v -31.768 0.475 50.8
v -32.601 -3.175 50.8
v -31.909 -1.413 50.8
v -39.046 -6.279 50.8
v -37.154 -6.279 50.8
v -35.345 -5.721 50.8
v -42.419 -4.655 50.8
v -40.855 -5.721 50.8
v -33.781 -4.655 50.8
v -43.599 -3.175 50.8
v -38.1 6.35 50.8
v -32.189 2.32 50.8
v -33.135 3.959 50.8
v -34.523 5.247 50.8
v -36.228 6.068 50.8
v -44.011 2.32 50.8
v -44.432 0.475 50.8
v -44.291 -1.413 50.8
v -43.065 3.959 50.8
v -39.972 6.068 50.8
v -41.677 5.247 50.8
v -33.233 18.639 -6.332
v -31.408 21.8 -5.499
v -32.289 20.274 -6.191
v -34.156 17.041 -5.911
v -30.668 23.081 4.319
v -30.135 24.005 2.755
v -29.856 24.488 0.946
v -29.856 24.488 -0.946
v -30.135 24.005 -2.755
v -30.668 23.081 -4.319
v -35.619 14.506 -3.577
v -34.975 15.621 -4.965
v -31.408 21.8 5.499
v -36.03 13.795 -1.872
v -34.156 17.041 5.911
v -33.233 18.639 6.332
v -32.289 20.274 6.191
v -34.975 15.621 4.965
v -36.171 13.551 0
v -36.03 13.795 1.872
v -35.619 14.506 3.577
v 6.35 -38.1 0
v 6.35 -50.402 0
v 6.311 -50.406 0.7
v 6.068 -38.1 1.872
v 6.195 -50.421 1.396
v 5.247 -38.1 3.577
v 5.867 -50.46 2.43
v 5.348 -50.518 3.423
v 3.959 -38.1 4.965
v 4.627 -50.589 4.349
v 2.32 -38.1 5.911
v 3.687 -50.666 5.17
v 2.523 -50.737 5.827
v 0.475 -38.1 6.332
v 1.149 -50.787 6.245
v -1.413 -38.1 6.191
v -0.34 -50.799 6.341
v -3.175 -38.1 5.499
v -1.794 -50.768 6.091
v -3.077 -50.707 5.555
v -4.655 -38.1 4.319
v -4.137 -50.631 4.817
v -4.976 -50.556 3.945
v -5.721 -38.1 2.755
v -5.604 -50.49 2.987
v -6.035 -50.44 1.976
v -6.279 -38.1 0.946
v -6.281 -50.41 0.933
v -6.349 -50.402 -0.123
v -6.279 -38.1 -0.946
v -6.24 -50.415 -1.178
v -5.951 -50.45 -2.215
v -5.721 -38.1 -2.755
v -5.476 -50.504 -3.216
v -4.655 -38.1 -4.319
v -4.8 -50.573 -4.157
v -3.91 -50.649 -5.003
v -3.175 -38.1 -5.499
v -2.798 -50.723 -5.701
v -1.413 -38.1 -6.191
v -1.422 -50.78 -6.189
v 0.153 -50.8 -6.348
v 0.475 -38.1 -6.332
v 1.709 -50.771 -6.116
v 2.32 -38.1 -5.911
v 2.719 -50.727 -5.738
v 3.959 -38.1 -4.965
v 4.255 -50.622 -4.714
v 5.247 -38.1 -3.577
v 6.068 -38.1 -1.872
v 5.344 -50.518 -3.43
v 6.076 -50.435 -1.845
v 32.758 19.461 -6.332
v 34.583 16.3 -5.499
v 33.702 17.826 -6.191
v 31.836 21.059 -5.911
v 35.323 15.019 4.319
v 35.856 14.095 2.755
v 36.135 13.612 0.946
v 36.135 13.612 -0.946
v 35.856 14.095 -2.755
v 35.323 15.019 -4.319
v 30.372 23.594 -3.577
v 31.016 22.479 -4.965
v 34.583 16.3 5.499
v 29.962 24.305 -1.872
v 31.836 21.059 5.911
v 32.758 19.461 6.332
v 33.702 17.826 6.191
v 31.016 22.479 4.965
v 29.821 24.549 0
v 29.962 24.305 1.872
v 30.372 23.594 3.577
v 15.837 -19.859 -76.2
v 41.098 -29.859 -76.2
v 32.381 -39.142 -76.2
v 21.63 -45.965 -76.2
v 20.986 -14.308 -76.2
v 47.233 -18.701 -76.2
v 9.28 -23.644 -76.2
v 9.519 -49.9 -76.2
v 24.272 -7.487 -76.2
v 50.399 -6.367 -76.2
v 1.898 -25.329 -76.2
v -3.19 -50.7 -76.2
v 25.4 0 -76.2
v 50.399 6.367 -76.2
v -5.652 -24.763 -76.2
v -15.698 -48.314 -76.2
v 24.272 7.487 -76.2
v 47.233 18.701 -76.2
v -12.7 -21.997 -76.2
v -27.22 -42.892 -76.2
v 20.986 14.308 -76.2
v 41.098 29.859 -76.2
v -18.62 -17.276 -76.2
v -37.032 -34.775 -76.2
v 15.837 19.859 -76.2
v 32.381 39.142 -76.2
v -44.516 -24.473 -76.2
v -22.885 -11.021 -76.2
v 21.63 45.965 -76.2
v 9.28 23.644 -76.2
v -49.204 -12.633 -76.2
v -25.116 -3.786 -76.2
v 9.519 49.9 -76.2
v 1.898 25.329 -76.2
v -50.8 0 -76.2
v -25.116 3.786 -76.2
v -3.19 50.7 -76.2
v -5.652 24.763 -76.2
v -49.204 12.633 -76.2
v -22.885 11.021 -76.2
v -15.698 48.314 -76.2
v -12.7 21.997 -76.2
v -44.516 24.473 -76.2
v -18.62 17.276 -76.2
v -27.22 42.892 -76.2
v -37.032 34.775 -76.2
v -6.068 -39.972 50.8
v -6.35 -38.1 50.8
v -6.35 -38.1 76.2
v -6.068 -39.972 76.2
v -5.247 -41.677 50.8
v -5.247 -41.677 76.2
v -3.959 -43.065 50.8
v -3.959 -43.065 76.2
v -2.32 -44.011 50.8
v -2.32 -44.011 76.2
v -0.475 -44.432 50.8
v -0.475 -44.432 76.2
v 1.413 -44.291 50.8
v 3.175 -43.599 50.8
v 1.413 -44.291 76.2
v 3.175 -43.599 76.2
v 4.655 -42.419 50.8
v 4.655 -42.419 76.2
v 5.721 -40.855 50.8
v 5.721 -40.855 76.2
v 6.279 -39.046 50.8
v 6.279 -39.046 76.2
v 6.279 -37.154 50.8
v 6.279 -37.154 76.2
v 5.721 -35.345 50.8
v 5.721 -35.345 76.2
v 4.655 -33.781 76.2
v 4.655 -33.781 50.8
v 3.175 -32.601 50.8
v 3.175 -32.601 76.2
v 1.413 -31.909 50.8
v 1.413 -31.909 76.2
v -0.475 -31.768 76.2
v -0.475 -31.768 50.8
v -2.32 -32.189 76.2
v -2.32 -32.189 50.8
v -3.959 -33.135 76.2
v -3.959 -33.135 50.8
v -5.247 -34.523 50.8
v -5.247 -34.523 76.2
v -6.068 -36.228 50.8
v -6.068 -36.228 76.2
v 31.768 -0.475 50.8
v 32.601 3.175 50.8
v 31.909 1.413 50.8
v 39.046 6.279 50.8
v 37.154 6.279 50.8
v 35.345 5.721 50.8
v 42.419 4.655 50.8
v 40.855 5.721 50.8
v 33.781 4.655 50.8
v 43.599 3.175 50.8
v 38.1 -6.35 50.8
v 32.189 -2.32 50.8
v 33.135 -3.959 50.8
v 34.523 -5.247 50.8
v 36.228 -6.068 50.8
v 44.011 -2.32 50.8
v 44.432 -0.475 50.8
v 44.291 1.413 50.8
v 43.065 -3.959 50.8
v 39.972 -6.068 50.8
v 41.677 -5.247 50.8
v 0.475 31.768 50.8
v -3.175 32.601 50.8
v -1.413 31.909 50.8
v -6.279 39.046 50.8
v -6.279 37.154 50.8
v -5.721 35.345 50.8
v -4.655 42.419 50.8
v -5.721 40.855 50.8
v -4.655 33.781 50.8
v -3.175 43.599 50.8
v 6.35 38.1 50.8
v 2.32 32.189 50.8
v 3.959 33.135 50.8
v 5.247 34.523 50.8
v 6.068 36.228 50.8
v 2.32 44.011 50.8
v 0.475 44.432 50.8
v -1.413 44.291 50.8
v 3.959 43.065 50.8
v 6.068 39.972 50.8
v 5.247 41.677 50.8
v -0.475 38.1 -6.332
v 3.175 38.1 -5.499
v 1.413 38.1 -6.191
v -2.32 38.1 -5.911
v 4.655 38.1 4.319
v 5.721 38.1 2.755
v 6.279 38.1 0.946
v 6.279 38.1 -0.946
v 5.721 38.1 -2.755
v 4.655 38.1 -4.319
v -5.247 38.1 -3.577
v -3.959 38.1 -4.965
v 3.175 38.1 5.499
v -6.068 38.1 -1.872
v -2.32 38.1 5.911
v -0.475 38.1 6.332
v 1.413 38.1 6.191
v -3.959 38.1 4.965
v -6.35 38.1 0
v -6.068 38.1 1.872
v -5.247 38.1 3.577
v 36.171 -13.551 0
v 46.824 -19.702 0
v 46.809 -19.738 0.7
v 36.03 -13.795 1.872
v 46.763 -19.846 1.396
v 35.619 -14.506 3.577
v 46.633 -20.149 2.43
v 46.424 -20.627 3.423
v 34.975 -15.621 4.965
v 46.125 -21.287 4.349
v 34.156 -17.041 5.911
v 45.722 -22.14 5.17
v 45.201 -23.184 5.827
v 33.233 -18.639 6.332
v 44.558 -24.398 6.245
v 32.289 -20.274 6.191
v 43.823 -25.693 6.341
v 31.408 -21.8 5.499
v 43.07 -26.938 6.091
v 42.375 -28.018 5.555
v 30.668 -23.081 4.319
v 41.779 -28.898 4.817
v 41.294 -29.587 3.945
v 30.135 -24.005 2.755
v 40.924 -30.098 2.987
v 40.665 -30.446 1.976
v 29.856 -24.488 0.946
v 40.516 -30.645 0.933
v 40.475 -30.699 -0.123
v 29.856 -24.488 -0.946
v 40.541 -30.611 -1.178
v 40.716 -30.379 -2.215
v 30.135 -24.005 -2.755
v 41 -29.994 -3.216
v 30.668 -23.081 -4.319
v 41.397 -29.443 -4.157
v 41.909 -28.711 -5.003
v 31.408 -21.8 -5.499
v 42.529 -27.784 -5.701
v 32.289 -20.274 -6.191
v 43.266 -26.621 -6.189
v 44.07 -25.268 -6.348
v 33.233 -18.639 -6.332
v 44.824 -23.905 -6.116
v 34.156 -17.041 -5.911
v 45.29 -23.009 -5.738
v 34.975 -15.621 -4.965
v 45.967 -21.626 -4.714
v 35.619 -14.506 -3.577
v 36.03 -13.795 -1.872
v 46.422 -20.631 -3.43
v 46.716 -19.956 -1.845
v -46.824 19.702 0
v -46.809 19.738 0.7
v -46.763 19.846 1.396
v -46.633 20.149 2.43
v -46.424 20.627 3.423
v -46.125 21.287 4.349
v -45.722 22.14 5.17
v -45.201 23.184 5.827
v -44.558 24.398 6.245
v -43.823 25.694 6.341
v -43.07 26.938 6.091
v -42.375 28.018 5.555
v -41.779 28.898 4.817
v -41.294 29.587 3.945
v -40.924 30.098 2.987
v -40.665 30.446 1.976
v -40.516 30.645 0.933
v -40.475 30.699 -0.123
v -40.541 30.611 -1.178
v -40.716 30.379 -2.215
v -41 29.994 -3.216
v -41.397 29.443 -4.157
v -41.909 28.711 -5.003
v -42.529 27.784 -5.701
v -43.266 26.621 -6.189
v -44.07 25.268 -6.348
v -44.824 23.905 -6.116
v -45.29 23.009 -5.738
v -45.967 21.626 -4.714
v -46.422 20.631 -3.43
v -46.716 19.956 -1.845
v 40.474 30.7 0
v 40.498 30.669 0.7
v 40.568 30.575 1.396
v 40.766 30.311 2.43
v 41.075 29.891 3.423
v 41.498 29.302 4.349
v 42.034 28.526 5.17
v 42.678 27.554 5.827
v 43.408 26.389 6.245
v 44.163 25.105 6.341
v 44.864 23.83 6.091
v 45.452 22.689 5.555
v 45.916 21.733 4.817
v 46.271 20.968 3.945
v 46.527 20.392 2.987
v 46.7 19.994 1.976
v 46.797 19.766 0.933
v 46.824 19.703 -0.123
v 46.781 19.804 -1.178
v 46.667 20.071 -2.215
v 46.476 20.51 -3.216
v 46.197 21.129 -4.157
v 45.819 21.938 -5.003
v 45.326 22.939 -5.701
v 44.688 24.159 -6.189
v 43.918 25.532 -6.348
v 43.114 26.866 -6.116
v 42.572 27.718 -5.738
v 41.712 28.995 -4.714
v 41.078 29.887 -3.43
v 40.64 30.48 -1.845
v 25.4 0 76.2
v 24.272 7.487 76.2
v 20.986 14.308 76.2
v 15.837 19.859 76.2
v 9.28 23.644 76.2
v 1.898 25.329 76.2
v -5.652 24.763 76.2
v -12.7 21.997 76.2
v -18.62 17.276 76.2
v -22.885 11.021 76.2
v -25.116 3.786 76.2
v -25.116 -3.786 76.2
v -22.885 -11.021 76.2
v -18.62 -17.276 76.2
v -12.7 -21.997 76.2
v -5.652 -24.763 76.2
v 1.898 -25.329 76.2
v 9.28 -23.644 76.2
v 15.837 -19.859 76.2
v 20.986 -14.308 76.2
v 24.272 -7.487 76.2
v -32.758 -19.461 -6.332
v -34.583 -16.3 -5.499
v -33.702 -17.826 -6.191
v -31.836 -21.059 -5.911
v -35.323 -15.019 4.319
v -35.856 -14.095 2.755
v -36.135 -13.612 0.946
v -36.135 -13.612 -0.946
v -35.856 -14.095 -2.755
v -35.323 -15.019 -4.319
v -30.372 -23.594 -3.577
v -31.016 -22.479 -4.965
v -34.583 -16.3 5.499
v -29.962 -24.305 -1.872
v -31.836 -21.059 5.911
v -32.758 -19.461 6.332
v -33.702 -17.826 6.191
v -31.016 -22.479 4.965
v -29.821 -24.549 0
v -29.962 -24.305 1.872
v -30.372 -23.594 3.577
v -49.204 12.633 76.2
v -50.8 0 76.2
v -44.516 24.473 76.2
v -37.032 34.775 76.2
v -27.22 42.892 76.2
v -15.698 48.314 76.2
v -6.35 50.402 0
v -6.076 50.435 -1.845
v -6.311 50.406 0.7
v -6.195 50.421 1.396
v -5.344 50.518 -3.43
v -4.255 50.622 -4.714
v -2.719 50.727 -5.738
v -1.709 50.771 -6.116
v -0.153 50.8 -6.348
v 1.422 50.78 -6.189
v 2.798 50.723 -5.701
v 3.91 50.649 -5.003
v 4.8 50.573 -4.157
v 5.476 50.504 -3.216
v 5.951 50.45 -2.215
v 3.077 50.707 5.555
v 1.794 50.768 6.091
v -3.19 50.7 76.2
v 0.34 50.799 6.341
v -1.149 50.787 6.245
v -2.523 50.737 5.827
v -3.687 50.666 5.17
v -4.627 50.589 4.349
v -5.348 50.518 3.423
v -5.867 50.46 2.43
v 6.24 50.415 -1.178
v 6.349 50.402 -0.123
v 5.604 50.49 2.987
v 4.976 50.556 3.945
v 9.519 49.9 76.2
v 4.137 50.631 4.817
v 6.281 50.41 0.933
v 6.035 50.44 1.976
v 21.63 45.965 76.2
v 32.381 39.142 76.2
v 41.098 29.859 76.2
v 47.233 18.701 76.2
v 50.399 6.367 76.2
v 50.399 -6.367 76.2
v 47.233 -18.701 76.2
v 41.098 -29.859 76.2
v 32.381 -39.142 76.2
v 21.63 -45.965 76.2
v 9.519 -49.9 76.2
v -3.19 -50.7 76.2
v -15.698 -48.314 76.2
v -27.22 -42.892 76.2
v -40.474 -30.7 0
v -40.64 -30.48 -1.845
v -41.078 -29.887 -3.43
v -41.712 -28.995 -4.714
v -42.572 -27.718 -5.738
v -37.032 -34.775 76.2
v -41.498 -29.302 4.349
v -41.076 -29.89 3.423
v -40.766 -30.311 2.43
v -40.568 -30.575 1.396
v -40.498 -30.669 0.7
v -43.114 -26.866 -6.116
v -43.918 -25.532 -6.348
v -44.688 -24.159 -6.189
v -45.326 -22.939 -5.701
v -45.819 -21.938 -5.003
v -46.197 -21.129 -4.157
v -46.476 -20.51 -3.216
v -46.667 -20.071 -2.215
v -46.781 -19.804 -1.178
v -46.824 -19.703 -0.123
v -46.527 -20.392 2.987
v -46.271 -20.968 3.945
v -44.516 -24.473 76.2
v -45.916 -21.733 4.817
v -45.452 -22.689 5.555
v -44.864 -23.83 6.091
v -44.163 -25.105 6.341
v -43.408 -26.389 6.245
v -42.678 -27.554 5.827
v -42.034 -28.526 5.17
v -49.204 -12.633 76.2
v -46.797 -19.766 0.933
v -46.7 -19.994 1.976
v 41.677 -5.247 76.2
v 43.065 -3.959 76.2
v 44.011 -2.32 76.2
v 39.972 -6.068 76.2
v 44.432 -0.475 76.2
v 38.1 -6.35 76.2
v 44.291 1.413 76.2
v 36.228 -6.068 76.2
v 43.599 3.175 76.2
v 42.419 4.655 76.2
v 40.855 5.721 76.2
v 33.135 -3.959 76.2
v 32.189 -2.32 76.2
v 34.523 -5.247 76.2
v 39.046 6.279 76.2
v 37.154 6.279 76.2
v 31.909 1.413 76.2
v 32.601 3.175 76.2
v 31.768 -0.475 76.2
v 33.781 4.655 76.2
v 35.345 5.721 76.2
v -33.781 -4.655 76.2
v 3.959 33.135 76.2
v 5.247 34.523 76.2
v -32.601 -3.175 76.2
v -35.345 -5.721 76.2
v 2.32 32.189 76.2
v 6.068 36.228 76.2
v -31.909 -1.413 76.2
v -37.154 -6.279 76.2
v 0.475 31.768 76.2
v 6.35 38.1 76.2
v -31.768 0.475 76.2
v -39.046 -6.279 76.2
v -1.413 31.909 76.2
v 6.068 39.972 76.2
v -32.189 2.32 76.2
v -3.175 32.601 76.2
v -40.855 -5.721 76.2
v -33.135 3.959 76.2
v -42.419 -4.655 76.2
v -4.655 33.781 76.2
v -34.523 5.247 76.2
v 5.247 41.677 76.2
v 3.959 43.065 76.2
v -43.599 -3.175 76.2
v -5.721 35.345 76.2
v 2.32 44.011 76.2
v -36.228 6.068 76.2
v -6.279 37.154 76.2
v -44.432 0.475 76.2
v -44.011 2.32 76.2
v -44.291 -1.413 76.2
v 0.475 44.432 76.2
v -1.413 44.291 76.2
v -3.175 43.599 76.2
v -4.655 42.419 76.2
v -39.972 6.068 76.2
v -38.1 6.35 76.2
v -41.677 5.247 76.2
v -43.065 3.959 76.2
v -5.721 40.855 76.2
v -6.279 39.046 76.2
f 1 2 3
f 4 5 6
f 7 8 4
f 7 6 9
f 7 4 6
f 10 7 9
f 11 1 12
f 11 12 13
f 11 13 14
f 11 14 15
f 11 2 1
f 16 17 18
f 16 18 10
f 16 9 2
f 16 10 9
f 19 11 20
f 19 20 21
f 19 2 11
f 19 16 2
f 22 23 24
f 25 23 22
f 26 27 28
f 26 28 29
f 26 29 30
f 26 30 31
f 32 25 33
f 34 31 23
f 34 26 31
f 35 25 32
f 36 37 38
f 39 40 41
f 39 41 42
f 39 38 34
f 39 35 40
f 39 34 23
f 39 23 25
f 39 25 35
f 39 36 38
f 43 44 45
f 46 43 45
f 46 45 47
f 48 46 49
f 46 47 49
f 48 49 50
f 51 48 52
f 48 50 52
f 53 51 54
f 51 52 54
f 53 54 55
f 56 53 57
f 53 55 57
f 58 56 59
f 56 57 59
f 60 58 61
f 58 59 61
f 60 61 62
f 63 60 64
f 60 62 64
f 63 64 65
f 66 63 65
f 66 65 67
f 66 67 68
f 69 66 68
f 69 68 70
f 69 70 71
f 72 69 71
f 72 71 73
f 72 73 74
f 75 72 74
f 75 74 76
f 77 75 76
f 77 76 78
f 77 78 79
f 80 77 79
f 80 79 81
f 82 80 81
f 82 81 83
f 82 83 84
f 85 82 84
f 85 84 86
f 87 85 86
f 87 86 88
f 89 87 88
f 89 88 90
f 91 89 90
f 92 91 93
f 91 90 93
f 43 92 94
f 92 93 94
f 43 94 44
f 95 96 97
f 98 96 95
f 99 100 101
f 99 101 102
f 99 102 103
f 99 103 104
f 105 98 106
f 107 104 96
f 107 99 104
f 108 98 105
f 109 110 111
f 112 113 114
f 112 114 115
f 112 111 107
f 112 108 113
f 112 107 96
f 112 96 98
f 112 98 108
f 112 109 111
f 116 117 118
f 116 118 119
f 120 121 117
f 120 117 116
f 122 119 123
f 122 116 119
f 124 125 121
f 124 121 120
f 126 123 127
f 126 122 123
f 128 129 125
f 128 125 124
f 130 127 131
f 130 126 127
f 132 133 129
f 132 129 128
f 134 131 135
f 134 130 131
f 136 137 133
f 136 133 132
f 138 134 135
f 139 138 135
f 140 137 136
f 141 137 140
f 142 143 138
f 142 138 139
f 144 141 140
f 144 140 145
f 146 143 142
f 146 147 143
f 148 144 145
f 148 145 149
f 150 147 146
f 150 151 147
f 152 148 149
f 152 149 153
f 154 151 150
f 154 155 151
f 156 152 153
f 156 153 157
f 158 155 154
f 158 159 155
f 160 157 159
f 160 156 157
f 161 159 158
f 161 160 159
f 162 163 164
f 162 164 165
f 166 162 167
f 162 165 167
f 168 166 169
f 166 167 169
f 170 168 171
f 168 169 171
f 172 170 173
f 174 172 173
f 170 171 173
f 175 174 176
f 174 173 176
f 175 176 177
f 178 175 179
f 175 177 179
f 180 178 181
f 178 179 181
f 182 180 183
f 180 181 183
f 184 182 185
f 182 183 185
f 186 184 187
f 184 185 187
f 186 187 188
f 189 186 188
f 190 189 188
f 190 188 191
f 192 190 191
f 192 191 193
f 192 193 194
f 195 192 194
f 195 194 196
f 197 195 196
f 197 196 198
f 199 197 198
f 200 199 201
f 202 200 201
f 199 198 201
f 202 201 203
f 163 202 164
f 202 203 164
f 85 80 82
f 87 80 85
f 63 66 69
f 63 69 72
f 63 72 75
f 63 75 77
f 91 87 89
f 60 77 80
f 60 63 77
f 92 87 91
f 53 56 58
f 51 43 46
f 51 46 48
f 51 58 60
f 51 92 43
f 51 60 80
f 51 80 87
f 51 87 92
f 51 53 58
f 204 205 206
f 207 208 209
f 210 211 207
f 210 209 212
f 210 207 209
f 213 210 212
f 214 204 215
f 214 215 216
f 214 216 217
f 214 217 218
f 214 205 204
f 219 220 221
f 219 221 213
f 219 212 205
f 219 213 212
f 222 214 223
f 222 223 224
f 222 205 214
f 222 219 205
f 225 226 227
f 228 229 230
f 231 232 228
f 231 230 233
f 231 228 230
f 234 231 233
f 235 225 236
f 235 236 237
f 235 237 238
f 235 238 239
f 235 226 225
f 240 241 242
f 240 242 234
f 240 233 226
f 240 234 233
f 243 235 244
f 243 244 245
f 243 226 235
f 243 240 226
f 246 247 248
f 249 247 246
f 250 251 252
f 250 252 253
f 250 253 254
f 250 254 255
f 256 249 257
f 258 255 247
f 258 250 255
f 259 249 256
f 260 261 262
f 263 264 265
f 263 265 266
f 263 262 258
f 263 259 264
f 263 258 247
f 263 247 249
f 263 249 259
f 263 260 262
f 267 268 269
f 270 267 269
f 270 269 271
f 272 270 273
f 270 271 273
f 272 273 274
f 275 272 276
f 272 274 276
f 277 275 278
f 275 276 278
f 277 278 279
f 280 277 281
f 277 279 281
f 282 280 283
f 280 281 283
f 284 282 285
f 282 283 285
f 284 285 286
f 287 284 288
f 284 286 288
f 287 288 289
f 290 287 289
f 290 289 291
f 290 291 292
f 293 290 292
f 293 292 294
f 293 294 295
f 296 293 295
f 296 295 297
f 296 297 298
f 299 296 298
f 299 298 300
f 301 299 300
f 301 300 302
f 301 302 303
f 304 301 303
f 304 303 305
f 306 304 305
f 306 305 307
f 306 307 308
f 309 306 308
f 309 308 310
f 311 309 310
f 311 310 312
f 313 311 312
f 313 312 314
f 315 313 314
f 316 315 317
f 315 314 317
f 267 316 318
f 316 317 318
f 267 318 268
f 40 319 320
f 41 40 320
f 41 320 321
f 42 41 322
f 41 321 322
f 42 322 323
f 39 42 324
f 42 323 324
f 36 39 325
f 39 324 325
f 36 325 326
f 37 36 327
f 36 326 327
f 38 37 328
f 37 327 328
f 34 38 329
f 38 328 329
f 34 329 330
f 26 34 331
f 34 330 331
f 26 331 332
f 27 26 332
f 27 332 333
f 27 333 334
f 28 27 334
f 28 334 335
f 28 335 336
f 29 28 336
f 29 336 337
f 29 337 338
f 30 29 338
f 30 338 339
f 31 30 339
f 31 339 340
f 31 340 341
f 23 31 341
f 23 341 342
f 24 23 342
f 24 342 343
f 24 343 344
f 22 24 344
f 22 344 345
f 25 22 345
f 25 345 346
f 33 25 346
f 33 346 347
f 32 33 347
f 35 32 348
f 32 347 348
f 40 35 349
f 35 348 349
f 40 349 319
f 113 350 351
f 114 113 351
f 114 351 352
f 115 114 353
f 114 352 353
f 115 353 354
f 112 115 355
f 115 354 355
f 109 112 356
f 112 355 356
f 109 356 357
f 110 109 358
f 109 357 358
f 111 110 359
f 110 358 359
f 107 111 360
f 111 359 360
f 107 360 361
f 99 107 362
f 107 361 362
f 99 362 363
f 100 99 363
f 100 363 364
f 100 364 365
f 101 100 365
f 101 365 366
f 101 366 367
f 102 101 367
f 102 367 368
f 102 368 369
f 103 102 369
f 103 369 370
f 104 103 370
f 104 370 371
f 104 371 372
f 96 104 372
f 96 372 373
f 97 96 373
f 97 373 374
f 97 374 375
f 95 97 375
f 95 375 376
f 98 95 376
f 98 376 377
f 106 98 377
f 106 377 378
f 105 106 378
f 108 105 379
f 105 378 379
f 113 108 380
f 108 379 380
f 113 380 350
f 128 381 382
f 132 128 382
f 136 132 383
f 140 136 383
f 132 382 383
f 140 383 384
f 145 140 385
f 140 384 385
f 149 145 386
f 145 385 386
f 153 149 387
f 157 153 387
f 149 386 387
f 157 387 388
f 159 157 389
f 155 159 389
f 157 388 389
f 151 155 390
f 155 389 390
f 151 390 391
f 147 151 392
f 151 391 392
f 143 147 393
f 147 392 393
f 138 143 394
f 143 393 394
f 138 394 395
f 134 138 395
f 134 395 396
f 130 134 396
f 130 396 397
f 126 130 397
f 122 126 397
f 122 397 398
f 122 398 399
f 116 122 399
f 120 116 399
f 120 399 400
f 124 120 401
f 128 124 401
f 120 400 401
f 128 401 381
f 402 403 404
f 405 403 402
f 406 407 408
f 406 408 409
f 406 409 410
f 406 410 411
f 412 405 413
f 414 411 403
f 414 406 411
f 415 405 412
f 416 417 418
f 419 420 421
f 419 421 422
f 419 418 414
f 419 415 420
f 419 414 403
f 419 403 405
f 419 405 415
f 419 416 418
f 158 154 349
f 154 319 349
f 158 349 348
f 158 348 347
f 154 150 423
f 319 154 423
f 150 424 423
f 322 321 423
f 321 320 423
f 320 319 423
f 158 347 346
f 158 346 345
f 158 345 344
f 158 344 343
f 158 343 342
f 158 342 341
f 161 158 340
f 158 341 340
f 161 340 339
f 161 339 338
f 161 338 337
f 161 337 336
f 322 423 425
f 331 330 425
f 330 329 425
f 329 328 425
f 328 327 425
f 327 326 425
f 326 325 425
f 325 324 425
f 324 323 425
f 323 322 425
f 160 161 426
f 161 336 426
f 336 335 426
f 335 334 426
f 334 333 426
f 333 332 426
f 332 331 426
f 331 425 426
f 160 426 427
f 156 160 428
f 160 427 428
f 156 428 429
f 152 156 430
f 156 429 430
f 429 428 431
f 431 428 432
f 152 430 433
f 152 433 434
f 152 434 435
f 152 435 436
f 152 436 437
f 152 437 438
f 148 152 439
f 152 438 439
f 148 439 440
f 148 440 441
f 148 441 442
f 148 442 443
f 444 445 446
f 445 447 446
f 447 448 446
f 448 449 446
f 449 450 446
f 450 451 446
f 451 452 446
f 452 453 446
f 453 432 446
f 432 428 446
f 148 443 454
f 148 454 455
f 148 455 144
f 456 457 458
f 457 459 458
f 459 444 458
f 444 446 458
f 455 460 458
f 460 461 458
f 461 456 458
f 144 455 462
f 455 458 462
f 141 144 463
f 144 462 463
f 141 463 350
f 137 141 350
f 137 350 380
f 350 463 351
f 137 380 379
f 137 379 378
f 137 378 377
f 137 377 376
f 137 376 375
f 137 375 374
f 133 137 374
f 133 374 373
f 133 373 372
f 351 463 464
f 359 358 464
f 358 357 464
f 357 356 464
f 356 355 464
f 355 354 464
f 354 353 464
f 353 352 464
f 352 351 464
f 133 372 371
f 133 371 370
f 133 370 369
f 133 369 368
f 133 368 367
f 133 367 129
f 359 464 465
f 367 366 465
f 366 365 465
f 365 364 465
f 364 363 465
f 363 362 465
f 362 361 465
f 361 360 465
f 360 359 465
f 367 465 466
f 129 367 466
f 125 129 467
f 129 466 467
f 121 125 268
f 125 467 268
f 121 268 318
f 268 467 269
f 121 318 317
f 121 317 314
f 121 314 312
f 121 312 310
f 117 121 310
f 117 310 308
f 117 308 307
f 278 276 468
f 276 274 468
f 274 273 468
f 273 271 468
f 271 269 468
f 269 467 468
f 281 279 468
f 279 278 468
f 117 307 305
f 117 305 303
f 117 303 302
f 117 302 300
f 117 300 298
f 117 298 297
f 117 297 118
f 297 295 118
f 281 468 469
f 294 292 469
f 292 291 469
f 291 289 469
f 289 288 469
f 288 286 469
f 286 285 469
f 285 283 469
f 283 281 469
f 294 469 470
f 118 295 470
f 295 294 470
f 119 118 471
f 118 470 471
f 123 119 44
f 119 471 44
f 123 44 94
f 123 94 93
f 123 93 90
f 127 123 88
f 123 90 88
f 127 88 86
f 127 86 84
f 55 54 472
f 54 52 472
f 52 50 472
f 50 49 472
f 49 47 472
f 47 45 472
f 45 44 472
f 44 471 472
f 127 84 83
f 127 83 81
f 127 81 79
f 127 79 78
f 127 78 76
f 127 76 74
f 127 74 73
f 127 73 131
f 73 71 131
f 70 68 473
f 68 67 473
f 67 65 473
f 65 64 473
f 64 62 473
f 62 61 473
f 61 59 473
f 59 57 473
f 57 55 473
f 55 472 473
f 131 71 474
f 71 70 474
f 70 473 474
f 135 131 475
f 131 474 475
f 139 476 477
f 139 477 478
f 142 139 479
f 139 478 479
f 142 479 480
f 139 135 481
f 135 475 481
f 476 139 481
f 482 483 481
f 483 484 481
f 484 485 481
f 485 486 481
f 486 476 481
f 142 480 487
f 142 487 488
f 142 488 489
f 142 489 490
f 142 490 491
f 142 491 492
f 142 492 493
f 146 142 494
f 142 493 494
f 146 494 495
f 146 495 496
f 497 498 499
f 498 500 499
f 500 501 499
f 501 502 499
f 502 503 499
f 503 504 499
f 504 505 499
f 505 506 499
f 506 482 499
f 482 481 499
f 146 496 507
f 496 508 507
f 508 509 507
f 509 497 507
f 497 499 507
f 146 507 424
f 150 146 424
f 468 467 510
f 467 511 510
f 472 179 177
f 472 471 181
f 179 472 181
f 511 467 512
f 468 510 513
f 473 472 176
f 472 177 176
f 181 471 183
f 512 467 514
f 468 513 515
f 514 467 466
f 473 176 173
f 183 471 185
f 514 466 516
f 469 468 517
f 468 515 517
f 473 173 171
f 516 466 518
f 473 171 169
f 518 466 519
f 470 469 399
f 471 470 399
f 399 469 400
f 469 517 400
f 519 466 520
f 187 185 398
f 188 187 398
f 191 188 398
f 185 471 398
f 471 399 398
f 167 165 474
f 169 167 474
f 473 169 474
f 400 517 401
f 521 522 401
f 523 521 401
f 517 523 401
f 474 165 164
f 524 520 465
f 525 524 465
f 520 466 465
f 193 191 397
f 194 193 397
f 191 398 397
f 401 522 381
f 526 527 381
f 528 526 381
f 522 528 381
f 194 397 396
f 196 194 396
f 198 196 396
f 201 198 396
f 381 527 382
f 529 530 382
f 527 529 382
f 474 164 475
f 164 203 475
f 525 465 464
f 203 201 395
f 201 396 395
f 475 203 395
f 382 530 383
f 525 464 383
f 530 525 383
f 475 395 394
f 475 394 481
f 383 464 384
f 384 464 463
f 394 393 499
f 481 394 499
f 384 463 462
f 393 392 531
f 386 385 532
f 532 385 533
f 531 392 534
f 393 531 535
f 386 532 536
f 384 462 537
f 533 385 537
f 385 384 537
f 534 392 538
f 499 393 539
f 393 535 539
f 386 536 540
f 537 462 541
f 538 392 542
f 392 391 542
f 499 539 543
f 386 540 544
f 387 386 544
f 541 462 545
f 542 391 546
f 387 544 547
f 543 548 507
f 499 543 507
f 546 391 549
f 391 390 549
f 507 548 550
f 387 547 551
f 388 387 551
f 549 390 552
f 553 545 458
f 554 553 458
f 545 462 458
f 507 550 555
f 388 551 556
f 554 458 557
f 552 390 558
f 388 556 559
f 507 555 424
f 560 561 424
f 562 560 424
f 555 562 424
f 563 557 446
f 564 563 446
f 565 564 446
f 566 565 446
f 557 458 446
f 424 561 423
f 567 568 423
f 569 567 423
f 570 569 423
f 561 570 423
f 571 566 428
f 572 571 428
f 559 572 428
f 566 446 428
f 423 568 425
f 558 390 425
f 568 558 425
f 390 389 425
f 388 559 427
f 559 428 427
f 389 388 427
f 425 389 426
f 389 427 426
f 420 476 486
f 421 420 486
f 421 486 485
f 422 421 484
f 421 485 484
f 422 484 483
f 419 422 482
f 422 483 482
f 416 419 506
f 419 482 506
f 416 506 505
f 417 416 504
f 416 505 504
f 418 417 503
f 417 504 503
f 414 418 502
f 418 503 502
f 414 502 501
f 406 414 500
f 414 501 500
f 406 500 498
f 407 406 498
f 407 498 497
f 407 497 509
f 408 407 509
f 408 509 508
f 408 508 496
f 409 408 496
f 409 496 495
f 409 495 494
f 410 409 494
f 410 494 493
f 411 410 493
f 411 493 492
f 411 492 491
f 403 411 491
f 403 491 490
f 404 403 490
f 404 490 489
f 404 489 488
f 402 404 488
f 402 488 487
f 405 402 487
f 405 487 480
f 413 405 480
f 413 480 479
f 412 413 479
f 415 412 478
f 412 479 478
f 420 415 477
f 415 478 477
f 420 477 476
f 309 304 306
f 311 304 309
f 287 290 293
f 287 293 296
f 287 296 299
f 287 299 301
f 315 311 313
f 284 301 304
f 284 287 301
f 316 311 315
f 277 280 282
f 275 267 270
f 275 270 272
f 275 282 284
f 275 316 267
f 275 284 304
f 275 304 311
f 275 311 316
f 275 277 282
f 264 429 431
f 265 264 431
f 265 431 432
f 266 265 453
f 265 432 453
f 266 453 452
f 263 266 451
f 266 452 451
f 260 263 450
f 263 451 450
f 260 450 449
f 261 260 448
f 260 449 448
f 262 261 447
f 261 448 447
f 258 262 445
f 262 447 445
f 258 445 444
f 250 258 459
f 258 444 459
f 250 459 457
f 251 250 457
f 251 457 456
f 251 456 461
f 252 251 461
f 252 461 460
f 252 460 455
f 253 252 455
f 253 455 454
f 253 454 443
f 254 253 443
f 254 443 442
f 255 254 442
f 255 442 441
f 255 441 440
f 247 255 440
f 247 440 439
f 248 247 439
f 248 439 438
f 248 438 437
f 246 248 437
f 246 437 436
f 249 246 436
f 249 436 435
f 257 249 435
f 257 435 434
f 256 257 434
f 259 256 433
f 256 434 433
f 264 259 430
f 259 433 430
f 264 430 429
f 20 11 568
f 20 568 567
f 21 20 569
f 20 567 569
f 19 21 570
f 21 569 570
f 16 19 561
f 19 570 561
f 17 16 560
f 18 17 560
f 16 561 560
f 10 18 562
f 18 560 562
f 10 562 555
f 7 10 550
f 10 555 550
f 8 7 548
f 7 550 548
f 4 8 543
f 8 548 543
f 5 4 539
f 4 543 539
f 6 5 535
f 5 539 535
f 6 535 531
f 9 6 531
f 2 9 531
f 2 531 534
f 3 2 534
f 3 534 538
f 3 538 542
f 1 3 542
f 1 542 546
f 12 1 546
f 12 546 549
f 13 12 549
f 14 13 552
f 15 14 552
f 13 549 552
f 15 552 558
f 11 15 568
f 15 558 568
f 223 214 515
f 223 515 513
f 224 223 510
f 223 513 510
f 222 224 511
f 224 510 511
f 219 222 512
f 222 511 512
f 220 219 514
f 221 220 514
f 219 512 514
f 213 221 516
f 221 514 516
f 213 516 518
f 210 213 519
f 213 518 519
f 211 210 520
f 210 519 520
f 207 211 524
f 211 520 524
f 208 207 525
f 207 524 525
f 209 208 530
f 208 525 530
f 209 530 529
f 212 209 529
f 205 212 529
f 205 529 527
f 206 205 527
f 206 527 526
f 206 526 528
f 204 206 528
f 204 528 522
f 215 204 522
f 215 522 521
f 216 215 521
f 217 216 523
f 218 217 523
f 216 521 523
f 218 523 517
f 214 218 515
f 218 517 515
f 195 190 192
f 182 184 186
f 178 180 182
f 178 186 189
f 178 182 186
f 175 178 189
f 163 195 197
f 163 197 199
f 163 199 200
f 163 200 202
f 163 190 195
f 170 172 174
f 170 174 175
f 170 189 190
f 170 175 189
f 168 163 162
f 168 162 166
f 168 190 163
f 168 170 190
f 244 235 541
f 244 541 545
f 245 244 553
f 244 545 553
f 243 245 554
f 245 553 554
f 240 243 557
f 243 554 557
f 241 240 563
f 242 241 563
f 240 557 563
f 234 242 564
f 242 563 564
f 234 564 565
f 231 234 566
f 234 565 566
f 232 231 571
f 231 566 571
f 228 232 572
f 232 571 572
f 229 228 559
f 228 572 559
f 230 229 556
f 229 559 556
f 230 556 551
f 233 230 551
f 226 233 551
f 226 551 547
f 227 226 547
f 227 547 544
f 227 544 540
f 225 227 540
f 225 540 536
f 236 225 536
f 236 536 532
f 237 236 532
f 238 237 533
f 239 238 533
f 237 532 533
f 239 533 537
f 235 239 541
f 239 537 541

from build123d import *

# Parameters (mm, degrees)
F0_W      = 50.8
F0_H      = 152.4
F3_R      = 6.35
F4_DEPTH  = 12.7
F5_COUNT  = 6
F8_R      = 25.4
F9_DEPTH  = 152.4
F12_R     = 6.35
F13_DEPTH = 25.4
F14_COUNT = 4


with BuildPart() as f1:
    # F0 (on Front) → F1 (revolve)
    with BuildSketch(Plane.XZ):
        with Locations((-25.4, 0)):
            Rectangle(F0_W, F0_H)
    revolve(axis=Axis((0, 0, 0), (0, 0, -1)))


with BuildPart() as f4:
    # F3 (on offset) → F4 (new body)
    with BuildSketch(Plane.XZ.offset(50.8)):
        Circle(F3_R)
    extrude(amount=-F4_DEPTH)


with BuildPart() as f5_1:
    # F5: instance of F4
    add(f4.part.rotate(Axis((0, 0, -76.2), (0, 0, -1)), 1 * 360 / F5_COUNT))


with BuildPart() as f5_2:
    # F5: instance of F4
    add(f4.part.rotate(Axis((0, 0, -76.2), (0, 0, -1)), 2 * 360 / F5_COUNT))


with BuildPart() as f5_3:
    # F5: instance of F4
    add(f4.part.rotate(Axis((0, 0, -76.2), (0, 0, -1)), 3 * 360 / F5_COUNT))


with BuildPart() as f5_4:
    # F5: instance of F4
    add(f4.part.rotate(Axis((0, 0, -76.2), (0, 0, -1)), 4 * 360 / F5_COUNT))


with BuildPart() as f5_5:
    # F5: instance of F4
    add(f4.part.rotate(Axis((0, 0, -76.2), (0, 0, -1)), 5 * 360 / F5_COUNT))


with BuildPart() as f1_1:
    add(f1.part)

    # F6: cut F4, F5_1, F5_2, F5_3, F5_4, F5_5
    add(f4.part, mode=Mode.SUBTRACT)
    add(f5_1.part, mode=Mode.SUBTRACT)
    add(f5_2.part, mode=Mode.SUBTRACT)
    add(f5_3.part, mode=Mode.SUBTRACT)
    add(f5_4.part, mode=Mode.SUBTRACT)
    add(f5_5.part, mode=Mode.SUBTRACT)


with BuildPart() as f9:
    # F8 (on offset) → F9 (new body)
    with BuildSketch(Plane.XY.offset(76.2)):
        Circle(F8_R)
    extrude(amount=-F9_DEPTH)


with BuildPart() as f1_2:
    add(f1_1.part)

    # F10: cut F9
    add(f9.part, mode=Mode.SUBTRACT)


with BuildPart() as f13:
    # F12 (on offset) → F13 (new body)
    with BuildSketch(Plane.XY.offset(76.2)):
        with Locations((0, 38.1)):
            Circle(F12_R)
    extrude(amount=-F13_DEPTH)


with BuildPart() as f14_1:
    # F14: instance of F13
    add(f13.part.rotate(Axis((0, 0, 0), (0, 0, -1)), 1 * 360 / F14_COUNT))


with BuildPart() as f14_2:
    # F14: instance of F13
    add(f13.part.rotate(Axis((0, 0, 0), (0, 0, -1)), 2 * 360 / F14_COUNT))


with BuildPart() as f14_3:
    # F14: instance of F13
    add(f13.part.rotate(Axis((0, 0, 0), (0, 0, -1)), 3 * 360 / F14_COUNT))


with BuildPart() as f1_3:
    add(f1_2.part)

    # F15: cut F13, F14_1, F14_2, F14_3
    add(f13.part, mode=Mode.SUBTRACT)
    add(f14_1.part, mode=Mode.SUBTRACT)
    add(f14_2.part, mode=Mode.SUBTRACT)
    add(f14_3.part, mode=Mode.SUBTRACT)


solid = f1_3.part
